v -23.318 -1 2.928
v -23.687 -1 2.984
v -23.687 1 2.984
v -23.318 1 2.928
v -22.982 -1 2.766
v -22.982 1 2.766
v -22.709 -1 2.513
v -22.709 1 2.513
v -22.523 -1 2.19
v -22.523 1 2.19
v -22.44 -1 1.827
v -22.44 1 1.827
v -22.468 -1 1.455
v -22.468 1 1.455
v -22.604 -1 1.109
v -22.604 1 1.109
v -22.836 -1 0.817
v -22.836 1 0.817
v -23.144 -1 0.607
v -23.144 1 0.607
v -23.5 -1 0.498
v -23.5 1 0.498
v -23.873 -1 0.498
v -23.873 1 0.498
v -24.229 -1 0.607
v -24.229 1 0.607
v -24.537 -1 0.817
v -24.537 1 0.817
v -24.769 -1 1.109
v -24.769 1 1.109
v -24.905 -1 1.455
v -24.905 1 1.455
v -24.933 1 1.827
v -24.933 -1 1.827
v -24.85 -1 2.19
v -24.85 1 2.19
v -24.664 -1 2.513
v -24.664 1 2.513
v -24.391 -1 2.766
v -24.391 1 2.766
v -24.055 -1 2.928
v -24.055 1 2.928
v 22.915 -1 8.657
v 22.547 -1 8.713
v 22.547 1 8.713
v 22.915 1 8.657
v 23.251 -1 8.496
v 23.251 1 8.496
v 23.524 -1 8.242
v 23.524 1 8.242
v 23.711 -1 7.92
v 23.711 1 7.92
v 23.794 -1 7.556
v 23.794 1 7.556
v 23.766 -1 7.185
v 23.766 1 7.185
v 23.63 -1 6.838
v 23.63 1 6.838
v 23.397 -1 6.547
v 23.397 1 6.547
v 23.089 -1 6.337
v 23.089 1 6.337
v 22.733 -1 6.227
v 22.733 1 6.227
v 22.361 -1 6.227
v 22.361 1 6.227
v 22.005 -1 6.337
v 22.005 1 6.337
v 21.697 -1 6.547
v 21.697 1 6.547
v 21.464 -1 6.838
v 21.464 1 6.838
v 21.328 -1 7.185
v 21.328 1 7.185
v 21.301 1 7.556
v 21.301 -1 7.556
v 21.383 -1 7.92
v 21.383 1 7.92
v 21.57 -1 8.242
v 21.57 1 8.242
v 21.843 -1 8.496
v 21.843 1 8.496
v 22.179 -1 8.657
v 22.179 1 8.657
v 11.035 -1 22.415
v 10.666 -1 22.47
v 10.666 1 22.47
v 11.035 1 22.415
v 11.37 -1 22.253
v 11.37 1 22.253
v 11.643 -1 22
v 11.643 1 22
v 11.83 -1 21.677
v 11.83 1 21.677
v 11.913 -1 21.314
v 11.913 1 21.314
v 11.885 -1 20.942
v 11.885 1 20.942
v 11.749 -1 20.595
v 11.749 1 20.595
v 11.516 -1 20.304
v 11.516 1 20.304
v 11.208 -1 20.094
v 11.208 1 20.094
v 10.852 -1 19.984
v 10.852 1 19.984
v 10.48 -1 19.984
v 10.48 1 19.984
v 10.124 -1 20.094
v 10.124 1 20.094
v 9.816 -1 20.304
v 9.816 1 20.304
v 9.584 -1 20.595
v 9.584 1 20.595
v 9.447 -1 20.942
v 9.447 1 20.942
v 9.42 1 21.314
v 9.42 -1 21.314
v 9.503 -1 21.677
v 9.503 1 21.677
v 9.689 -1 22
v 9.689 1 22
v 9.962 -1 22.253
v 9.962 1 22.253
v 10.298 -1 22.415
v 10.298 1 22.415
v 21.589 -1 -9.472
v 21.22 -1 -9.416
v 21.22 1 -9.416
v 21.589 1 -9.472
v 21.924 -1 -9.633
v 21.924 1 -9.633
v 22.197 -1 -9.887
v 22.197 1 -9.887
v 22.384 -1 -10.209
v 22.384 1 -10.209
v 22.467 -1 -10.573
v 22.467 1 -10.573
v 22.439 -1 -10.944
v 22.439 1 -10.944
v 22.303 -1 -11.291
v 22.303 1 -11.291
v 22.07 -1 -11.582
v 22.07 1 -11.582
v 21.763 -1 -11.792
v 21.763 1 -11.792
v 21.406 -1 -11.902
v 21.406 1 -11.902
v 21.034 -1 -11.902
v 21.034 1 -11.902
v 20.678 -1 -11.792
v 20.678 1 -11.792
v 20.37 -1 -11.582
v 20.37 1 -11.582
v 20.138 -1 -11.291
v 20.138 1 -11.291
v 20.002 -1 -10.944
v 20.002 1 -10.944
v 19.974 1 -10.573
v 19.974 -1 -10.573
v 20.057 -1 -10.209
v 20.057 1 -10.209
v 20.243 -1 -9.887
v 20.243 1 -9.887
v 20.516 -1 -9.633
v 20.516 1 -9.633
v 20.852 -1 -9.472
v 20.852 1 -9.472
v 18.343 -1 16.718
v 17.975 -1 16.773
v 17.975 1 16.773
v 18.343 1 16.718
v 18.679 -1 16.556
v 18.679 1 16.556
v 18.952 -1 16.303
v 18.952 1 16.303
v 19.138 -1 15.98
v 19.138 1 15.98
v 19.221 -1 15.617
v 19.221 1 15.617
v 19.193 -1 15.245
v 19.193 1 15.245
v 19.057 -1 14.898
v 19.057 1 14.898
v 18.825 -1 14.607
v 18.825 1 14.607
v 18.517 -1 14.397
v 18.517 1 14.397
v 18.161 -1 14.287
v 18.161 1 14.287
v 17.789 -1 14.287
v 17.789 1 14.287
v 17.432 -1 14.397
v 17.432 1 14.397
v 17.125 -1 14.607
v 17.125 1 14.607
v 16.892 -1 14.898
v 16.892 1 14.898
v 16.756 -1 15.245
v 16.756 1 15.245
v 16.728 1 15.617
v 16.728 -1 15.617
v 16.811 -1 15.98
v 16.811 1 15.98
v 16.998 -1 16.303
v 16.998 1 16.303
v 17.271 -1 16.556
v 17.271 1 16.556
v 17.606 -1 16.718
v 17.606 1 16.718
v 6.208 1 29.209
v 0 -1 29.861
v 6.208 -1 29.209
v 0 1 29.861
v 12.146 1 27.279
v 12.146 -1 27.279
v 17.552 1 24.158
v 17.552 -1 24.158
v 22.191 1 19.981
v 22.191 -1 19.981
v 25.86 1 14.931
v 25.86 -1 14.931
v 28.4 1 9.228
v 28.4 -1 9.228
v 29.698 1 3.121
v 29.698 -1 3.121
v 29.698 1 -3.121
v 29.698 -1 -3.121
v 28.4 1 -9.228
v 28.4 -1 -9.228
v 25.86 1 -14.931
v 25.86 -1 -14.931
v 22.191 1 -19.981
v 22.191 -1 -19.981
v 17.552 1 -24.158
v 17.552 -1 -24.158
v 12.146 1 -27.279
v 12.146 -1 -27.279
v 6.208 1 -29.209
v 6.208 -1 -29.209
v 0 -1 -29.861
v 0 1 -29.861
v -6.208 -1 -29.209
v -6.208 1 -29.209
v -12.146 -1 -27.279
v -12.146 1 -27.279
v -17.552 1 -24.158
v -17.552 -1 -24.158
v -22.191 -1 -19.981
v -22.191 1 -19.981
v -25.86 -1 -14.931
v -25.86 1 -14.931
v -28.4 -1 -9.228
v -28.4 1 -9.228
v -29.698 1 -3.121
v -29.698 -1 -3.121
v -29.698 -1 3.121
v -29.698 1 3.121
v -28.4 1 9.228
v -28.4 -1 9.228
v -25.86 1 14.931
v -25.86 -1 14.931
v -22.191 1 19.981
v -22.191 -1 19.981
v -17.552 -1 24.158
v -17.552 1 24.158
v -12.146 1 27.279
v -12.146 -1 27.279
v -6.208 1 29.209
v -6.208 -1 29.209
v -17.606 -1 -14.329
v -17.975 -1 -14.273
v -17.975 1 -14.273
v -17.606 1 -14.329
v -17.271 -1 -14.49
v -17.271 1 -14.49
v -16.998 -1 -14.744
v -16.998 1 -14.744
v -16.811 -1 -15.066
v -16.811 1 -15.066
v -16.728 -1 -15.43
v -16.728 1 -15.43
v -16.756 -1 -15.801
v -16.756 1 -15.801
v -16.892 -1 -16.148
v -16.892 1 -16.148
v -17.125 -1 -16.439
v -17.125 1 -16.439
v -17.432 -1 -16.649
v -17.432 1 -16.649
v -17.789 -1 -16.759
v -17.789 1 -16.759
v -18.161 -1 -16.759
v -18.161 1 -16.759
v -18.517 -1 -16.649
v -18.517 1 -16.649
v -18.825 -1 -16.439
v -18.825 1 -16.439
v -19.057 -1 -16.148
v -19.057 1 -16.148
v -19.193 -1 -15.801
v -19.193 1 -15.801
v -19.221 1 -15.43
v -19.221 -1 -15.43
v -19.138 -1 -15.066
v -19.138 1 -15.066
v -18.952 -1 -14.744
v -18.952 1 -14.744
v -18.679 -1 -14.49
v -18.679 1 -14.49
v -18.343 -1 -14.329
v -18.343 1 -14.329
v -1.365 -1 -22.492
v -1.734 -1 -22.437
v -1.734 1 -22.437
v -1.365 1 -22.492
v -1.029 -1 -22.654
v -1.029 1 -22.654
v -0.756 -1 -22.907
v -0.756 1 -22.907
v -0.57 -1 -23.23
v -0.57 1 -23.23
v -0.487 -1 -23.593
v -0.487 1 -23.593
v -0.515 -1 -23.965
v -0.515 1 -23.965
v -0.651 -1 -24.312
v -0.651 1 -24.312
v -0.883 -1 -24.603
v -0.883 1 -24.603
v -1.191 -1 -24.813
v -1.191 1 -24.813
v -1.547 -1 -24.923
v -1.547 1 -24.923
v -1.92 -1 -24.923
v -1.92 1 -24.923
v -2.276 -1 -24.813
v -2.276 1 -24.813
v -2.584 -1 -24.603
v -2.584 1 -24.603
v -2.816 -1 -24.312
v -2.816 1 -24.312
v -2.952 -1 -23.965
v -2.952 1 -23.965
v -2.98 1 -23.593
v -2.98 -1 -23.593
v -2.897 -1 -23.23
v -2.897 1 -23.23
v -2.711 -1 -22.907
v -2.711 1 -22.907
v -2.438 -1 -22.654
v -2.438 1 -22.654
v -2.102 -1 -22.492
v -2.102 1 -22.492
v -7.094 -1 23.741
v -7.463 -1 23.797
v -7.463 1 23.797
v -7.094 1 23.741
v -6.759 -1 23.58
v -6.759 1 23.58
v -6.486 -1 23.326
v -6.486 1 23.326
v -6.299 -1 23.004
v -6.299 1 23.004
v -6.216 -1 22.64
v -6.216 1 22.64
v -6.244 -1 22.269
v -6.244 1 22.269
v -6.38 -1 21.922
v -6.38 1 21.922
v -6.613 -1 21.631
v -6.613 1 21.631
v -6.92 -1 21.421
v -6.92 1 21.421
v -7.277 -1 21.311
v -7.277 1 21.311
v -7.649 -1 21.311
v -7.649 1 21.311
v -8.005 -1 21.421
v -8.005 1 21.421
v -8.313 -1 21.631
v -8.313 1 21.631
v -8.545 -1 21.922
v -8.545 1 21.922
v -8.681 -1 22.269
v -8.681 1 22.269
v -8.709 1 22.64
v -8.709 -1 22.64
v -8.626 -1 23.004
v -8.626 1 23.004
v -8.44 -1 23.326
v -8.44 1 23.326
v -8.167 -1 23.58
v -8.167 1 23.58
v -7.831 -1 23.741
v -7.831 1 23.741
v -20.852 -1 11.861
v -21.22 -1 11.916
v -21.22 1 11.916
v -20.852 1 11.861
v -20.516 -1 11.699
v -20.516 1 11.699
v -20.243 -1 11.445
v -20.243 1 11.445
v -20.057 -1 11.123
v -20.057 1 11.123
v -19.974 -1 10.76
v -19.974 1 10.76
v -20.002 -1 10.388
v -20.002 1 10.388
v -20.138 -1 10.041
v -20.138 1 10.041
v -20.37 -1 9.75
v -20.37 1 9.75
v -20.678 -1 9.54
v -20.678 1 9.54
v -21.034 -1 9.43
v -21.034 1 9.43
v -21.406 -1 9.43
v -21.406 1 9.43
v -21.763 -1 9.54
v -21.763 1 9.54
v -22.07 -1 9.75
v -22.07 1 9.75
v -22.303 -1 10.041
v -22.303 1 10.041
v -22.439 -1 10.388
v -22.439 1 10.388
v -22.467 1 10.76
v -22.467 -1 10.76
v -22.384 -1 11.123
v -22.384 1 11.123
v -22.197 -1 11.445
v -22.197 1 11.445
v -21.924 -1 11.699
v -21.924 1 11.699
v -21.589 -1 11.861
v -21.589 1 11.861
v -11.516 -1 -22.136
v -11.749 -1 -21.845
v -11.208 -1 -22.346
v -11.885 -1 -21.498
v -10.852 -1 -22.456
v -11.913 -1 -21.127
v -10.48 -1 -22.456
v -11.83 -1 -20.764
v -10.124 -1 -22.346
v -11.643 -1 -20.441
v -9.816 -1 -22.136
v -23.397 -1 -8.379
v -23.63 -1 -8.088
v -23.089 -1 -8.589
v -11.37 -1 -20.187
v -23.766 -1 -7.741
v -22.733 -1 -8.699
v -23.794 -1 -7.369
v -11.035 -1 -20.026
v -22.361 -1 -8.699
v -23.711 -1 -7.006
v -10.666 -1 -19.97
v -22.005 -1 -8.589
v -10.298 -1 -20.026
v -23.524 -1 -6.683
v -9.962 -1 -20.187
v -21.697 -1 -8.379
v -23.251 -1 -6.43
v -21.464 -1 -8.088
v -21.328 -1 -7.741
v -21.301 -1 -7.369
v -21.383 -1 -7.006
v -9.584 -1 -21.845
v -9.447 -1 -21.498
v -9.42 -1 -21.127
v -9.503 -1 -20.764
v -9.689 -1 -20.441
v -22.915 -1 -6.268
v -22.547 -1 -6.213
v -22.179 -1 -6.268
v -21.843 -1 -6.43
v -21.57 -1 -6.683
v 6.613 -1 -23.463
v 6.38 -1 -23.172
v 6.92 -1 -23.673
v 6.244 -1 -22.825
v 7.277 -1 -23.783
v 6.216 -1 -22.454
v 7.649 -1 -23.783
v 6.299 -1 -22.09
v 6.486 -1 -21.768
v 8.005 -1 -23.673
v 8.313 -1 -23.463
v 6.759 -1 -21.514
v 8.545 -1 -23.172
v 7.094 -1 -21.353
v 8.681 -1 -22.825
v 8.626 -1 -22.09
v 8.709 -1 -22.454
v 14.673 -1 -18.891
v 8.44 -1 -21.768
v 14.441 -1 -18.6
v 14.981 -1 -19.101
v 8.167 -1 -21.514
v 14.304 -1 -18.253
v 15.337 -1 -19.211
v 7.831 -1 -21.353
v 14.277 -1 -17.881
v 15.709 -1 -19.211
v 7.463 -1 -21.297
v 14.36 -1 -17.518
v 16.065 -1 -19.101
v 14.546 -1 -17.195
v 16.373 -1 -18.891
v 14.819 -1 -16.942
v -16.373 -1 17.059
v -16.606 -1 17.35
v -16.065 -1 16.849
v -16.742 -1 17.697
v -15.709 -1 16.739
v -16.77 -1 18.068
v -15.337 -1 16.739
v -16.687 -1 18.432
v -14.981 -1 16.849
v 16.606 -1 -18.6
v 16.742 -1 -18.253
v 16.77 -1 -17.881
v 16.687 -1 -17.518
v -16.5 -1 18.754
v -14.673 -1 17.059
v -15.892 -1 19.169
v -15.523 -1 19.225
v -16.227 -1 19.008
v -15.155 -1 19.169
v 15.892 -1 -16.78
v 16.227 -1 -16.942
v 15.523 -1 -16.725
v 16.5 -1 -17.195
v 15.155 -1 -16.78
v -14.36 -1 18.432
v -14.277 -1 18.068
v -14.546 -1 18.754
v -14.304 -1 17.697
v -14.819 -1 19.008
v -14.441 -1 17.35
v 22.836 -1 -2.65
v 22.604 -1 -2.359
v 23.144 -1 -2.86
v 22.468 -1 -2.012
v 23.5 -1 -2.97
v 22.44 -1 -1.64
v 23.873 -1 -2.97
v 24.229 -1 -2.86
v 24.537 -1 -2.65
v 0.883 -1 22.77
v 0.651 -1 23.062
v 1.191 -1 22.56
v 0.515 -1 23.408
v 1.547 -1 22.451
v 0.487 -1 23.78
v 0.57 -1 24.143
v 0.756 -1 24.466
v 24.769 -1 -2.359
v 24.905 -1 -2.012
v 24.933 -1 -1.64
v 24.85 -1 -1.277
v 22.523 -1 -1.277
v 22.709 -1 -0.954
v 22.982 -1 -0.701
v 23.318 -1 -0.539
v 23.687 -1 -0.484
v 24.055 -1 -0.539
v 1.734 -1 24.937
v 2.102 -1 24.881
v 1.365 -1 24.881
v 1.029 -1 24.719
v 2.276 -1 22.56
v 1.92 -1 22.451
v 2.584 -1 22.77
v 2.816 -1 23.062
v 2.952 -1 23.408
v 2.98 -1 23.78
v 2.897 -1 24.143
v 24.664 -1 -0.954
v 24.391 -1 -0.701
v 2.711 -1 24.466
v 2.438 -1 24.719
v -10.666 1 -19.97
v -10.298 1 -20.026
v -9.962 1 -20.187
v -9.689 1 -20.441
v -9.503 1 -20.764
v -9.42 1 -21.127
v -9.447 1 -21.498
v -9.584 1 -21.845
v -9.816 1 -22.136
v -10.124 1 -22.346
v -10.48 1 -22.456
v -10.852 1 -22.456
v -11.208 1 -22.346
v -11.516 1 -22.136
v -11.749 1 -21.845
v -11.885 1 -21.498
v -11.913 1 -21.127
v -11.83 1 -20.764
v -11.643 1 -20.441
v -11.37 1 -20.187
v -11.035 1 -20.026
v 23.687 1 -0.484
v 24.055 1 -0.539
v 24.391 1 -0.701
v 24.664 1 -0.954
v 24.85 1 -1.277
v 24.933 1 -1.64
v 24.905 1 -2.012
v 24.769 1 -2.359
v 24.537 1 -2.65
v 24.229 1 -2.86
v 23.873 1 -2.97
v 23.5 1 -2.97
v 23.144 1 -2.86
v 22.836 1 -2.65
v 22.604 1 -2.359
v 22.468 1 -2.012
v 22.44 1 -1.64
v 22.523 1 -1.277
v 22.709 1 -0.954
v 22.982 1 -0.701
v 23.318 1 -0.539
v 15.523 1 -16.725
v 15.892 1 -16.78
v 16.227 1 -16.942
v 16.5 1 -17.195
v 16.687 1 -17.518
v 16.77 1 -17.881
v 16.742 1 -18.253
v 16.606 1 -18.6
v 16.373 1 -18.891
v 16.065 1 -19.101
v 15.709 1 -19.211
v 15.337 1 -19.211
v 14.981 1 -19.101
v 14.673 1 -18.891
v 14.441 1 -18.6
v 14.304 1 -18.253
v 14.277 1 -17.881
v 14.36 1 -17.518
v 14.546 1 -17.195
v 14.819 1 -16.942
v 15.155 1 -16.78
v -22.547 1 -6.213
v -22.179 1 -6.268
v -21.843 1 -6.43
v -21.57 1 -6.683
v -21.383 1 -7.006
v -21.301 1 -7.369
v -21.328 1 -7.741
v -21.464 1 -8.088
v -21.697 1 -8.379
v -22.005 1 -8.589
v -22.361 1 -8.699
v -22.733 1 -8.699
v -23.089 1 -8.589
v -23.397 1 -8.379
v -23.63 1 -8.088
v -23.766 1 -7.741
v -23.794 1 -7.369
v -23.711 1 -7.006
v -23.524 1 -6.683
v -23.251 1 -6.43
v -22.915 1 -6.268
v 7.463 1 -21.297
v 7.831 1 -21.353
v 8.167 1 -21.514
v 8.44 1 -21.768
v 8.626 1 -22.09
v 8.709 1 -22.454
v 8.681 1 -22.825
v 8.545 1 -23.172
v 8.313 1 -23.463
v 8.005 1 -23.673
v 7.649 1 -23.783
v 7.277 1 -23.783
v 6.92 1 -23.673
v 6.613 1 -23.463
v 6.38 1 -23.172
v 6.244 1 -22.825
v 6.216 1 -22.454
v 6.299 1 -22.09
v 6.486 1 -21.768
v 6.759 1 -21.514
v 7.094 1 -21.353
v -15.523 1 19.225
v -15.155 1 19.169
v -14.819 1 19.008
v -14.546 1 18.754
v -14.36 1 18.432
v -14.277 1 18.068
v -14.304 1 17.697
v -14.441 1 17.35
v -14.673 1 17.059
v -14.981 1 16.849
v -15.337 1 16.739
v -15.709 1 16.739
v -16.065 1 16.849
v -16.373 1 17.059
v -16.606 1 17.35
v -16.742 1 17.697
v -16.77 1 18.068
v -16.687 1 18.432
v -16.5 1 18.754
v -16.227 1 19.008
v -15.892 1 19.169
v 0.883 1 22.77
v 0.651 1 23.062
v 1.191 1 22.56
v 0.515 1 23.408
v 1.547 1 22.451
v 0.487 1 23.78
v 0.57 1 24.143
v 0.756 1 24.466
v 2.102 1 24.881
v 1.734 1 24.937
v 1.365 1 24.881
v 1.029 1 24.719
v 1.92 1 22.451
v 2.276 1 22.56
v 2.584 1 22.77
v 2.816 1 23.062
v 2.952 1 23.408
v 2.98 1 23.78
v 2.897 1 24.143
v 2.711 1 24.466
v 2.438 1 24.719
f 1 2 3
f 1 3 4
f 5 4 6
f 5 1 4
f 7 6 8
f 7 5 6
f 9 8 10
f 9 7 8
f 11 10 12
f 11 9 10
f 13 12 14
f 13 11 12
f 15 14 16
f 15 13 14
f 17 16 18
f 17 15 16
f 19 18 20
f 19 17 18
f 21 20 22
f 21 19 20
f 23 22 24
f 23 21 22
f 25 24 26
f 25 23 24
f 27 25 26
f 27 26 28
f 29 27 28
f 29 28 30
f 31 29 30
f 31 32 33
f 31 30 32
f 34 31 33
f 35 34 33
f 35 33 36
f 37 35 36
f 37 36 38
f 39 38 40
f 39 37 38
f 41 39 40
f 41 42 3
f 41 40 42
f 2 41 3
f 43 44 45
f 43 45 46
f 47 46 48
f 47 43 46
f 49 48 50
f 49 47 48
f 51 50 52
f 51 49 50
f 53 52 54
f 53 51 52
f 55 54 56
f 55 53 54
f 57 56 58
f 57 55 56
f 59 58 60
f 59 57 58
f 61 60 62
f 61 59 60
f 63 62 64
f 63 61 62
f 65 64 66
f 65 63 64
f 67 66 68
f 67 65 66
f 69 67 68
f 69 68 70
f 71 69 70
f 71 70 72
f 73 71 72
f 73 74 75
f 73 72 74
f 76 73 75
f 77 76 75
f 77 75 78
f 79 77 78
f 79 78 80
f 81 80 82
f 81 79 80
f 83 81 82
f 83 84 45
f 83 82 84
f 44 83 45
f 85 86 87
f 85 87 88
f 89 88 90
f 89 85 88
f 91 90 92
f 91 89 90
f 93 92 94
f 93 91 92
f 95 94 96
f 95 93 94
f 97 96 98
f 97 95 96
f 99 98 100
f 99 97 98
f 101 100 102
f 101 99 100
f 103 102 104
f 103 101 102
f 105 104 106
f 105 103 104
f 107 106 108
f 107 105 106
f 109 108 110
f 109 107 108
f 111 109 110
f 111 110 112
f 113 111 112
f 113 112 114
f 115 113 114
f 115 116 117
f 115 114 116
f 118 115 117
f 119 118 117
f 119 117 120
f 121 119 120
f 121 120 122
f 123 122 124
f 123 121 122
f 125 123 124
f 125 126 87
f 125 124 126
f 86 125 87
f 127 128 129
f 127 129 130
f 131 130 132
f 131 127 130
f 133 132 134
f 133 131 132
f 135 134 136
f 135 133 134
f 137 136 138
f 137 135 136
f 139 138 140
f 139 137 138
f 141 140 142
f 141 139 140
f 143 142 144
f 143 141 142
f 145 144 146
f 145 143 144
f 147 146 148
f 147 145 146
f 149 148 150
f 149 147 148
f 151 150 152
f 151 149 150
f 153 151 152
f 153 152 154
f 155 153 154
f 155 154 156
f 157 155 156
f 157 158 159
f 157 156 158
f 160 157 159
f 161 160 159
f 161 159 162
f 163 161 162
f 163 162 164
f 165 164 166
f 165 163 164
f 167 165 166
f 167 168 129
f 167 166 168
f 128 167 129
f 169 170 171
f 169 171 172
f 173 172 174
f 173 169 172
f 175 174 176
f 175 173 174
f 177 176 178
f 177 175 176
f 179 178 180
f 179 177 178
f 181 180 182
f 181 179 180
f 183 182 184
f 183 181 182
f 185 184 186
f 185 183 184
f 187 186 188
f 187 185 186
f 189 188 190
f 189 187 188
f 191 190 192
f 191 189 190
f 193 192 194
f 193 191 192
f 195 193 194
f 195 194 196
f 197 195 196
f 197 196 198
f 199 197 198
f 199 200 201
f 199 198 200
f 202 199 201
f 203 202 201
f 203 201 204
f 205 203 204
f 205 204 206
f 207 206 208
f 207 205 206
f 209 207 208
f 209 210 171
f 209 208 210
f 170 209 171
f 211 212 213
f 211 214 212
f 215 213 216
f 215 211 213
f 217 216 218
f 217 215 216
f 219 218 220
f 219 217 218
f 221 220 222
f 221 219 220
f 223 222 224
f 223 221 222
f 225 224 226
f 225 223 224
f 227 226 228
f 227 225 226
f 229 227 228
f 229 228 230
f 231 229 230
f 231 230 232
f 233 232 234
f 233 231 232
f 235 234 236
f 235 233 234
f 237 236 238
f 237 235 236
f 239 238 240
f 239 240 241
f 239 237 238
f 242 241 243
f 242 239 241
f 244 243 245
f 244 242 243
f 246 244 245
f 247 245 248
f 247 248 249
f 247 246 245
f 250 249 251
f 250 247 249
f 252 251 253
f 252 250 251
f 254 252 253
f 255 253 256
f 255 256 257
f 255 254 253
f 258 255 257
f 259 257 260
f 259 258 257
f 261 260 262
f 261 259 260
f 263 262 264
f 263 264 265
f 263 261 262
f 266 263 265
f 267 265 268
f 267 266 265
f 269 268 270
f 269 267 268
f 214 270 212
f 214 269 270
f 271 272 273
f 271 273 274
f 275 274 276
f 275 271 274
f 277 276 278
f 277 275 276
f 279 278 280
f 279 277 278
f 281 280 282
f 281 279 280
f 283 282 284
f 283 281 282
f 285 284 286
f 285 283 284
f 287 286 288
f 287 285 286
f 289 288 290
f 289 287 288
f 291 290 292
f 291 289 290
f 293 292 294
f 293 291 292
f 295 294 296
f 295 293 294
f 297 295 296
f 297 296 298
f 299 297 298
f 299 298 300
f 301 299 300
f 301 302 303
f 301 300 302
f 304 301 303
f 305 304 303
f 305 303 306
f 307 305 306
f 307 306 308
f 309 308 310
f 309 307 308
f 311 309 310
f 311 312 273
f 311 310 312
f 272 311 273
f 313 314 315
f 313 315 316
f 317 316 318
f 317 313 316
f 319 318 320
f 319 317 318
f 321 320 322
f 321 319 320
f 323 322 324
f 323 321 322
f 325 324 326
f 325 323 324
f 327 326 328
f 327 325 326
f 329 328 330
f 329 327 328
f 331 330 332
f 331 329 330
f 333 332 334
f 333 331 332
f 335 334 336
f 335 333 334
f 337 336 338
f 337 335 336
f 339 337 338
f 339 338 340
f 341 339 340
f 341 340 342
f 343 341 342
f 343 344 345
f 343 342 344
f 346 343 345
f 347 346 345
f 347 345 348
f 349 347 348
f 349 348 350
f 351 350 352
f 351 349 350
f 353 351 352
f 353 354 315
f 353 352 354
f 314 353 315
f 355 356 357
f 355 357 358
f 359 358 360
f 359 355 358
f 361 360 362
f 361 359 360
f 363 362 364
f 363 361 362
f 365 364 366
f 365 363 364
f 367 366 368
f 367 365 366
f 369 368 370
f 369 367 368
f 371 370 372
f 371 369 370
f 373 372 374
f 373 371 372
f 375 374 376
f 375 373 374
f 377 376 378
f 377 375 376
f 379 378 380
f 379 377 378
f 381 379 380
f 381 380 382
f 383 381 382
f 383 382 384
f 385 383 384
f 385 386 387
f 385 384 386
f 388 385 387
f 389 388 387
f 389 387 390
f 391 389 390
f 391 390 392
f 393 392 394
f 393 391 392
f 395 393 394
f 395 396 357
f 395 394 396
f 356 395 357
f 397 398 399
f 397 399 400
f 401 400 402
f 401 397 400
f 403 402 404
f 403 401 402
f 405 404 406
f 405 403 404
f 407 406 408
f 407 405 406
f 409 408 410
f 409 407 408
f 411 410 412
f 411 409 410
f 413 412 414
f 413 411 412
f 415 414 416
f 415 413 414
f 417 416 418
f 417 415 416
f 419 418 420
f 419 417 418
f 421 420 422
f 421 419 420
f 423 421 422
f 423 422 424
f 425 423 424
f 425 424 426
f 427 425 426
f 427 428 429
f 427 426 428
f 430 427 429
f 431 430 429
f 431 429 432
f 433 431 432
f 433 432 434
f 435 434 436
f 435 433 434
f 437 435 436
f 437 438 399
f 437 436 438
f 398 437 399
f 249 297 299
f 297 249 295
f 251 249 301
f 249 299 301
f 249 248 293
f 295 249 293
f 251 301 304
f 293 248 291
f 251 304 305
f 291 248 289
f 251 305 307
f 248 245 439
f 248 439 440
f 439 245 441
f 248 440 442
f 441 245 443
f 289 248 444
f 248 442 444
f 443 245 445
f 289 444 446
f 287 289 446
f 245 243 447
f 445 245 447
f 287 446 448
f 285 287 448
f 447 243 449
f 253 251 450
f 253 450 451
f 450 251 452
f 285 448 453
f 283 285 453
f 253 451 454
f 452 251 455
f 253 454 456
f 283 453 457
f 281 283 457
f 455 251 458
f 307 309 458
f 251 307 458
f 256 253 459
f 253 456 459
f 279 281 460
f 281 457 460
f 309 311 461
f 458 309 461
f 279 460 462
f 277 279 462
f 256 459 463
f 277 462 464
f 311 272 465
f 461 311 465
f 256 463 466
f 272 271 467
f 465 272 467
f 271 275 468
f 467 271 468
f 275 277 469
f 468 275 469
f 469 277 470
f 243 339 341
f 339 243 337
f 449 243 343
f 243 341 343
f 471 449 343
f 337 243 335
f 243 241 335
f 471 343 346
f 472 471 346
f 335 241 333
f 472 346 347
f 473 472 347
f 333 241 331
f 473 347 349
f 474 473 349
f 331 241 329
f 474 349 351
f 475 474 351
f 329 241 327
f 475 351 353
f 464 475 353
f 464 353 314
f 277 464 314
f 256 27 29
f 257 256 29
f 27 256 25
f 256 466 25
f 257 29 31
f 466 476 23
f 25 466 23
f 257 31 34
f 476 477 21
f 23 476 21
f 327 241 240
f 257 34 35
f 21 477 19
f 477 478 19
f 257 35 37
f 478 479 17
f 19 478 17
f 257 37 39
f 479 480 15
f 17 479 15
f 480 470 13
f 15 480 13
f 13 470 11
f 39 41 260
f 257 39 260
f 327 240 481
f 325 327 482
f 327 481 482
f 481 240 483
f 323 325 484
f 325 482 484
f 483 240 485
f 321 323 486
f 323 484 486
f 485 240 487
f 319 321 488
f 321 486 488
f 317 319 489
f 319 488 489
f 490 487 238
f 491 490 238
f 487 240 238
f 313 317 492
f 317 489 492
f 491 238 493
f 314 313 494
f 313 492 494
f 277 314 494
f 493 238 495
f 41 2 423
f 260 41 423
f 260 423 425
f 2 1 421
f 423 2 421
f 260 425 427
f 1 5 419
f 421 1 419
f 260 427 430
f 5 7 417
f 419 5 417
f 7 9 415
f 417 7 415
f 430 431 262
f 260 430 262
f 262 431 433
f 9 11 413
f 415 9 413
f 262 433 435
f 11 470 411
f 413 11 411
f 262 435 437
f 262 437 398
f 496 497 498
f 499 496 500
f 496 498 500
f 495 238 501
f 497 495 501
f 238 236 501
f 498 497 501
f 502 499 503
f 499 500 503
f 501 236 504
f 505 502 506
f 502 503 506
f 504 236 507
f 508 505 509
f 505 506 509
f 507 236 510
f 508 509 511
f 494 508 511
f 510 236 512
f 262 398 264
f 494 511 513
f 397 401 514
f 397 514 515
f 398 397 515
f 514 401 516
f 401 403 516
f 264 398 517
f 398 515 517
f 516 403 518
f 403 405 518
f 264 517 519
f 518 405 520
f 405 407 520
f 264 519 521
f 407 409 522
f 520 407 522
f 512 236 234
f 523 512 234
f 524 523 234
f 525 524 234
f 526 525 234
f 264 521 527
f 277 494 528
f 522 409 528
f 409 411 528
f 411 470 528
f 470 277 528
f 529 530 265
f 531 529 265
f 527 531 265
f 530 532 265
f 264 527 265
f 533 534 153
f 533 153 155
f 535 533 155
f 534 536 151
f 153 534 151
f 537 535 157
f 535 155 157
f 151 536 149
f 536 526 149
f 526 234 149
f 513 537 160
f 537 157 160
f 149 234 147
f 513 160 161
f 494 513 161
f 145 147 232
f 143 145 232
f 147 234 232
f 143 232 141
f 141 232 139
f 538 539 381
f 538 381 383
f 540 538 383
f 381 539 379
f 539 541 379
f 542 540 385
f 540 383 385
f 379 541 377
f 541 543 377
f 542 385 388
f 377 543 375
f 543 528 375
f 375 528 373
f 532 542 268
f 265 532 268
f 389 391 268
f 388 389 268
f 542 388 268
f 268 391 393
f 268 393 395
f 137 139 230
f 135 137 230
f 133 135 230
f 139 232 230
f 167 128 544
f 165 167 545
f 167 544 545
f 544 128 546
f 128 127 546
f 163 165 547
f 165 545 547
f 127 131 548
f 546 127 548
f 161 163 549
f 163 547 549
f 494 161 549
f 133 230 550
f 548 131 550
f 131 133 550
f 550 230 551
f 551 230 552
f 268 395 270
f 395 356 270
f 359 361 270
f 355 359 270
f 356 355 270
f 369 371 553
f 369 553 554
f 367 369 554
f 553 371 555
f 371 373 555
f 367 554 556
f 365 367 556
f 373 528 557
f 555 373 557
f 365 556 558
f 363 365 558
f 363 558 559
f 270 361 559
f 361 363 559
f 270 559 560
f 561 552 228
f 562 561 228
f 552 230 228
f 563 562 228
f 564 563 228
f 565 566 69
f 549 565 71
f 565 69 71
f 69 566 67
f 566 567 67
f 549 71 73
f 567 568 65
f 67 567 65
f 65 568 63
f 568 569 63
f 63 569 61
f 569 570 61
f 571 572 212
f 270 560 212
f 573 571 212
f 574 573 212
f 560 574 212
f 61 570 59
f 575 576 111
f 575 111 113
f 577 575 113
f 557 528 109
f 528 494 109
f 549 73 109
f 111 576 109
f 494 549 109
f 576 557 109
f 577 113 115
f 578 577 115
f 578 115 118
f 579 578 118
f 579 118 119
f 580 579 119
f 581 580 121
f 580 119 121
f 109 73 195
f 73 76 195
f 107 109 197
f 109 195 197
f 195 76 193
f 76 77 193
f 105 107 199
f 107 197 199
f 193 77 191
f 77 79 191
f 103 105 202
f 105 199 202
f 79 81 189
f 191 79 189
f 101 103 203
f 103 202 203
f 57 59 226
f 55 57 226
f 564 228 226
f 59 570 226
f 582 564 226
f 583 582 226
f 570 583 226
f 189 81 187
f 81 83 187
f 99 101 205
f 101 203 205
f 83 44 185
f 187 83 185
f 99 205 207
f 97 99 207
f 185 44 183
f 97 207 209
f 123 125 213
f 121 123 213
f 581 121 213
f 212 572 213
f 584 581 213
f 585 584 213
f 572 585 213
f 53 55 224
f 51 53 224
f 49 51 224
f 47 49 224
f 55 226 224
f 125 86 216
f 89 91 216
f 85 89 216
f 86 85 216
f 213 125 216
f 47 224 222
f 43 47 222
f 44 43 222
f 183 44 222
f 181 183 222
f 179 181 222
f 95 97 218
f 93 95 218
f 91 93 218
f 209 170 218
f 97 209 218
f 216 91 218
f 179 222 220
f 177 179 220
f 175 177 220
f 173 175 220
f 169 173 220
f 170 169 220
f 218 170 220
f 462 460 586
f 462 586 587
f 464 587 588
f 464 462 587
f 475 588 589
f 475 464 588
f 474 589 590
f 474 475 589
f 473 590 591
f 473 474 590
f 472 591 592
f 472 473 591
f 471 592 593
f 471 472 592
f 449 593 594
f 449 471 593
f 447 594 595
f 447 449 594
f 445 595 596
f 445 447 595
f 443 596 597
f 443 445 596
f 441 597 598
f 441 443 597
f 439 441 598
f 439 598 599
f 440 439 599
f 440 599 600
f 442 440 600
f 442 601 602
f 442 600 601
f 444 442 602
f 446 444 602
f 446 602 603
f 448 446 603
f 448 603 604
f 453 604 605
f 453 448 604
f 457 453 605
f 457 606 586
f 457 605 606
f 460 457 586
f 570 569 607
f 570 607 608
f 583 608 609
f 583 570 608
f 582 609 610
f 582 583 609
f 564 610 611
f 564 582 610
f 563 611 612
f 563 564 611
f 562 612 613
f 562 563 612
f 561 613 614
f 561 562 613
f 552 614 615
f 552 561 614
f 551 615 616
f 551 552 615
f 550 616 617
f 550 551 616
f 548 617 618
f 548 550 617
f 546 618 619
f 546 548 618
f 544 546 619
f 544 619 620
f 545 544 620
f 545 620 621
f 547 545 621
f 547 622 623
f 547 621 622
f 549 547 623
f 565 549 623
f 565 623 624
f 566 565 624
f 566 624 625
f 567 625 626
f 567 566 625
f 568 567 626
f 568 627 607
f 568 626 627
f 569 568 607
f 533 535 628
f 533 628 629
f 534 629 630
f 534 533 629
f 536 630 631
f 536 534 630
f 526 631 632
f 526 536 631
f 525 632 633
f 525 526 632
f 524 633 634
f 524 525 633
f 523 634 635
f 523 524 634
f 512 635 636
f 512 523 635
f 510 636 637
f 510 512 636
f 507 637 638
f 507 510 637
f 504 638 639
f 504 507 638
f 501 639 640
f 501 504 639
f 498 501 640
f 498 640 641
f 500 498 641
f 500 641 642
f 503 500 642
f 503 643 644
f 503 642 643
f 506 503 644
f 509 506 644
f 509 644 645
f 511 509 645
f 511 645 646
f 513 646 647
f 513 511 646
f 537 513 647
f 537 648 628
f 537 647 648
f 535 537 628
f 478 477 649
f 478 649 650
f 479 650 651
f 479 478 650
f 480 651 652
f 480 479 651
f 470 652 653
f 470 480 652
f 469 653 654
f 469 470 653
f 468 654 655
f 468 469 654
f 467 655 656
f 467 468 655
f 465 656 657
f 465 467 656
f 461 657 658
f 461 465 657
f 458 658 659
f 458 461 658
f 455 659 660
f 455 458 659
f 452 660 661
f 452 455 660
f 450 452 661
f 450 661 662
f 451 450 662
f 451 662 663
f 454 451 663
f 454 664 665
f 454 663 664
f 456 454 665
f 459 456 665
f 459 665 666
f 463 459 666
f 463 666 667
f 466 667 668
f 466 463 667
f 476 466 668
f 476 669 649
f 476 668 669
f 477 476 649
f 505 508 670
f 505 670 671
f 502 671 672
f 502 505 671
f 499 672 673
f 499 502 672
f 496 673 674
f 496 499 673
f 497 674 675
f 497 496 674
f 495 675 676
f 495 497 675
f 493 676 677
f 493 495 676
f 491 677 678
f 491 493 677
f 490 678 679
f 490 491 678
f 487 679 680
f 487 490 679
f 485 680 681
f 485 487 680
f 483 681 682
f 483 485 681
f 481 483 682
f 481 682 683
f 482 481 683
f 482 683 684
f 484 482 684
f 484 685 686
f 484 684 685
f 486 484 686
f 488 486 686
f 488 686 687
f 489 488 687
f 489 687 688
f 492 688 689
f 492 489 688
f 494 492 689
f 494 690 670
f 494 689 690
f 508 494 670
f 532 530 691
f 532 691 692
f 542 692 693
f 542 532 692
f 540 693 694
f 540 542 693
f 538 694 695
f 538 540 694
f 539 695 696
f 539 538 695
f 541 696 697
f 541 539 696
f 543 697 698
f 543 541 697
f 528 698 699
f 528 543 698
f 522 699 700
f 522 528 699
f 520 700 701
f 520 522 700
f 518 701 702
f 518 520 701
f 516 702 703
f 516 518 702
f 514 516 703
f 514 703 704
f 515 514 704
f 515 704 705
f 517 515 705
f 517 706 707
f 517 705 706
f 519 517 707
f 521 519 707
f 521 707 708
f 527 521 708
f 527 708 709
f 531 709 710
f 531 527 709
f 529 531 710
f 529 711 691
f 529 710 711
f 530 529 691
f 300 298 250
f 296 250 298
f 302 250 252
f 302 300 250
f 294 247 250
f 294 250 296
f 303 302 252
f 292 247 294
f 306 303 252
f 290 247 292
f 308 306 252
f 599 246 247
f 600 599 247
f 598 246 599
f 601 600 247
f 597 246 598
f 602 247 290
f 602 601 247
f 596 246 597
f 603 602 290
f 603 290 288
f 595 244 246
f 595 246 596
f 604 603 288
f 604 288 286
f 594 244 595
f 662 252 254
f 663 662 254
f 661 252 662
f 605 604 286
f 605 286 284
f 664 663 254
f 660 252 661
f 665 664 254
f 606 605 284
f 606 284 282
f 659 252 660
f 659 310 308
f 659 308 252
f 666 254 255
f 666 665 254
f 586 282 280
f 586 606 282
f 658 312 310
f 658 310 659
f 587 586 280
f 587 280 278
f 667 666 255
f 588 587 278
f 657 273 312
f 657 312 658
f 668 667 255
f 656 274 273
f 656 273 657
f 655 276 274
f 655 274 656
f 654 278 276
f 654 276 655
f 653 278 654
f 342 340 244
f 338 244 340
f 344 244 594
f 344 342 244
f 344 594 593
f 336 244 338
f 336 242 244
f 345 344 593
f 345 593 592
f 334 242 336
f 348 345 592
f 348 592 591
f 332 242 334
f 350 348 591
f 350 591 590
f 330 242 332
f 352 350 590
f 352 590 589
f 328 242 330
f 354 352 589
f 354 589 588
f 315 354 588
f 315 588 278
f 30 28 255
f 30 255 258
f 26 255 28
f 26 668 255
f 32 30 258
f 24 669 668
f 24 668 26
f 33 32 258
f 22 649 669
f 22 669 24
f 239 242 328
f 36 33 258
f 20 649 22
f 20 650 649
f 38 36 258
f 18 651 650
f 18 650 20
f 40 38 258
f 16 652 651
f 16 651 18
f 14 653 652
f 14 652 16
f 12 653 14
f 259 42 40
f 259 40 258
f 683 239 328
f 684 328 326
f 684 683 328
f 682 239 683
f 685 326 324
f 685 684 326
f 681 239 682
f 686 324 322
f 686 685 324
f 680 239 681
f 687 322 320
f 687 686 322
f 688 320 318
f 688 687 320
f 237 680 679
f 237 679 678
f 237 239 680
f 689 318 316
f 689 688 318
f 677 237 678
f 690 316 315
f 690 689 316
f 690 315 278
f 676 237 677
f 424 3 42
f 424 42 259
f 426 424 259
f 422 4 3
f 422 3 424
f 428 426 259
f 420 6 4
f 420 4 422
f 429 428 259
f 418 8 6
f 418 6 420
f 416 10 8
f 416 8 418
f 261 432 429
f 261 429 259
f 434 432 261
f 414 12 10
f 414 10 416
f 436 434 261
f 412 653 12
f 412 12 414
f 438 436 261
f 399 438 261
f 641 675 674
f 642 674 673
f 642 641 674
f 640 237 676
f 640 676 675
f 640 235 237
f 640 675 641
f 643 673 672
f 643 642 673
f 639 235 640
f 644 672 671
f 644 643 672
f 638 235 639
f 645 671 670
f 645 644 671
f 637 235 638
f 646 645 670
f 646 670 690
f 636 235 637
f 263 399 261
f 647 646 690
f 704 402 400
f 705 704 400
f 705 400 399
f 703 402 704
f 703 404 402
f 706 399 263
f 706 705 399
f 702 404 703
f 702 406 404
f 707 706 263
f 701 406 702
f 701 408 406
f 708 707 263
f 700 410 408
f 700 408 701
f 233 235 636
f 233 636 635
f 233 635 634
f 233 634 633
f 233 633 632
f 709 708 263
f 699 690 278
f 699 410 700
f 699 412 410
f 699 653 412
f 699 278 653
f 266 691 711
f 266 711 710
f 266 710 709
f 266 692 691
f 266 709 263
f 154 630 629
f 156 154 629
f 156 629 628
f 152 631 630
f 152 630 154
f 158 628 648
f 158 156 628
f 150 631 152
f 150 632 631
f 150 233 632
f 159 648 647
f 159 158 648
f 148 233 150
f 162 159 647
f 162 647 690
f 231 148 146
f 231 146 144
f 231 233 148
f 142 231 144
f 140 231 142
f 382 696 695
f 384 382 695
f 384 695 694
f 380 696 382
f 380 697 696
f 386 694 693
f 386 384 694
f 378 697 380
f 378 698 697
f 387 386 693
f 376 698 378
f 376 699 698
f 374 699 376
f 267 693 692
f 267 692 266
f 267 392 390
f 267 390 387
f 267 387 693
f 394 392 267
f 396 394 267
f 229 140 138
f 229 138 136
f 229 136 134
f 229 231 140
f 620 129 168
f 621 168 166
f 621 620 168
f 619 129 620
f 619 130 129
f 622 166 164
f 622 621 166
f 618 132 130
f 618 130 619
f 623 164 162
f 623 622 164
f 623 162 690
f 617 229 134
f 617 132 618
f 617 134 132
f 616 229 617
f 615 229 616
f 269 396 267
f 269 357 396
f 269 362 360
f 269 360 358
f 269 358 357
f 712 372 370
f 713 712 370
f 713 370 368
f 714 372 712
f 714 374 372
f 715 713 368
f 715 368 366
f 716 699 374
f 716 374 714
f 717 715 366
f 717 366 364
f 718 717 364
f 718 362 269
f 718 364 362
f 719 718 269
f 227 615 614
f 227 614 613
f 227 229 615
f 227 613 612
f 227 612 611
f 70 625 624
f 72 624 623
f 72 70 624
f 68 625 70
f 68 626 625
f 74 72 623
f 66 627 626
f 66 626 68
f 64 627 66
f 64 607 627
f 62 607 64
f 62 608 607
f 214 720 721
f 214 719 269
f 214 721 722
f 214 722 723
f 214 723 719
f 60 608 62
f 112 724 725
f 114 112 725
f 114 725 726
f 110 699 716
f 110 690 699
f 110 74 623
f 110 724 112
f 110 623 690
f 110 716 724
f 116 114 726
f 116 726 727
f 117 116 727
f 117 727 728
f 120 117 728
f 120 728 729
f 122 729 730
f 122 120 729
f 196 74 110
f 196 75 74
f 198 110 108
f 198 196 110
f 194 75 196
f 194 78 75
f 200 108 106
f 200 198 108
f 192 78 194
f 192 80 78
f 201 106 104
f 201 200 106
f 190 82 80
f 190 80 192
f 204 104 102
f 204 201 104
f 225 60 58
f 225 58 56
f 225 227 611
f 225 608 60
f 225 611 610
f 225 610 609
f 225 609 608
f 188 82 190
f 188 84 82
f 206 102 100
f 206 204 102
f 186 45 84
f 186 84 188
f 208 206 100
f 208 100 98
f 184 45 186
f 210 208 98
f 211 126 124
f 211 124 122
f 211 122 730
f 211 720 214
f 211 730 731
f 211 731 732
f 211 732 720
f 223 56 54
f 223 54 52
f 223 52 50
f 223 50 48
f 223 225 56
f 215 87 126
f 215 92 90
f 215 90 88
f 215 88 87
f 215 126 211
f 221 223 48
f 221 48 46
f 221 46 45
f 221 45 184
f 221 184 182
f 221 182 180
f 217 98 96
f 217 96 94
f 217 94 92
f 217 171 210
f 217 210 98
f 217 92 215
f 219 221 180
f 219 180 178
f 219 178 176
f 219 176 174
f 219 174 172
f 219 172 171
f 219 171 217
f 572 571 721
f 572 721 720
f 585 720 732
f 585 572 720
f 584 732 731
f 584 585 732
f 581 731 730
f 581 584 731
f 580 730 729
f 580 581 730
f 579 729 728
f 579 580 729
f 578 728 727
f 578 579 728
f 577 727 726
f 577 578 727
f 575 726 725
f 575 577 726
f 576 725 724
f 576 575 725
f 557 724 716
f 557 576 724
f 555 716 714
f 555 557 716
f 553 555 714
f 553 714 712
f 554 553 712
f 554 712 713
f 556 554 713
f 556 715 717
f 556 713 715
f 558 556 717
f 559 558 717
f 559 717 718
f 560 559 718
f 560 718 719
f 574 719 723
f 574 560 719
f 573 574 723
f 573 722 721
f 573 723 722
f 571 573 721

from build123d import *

# Parameters (mm, degrees)
SKETCH1_R               = 29.86111111
BOSS_EXTRUDE1_DEPTH     = 1
CUT_EXTRUDE1_DEPTH      = 43.277321503
CUT_EXTRUDE1_DEPTH_BACK = 43.277321503
SKETCH2_R               = 1.25


with BuildPart() as part:
    # Sketch1 → Boss-Extrude1 (new, symmetric)
    with BuildSketch(Plane(origin=(0, 0, 0), x_dir=(1, 0, 0), z_dir=(0, 1, 0))):
        with Locations(Location((0, 0, 0), (0, 0, 270))):
            Circle(SKETCH1_R)
    extrude(amount=BOSS_EXTRUDE1_DEPTH, both=True)

    # Sketch2 → Cut-Extrude1 (cut, two sides: drawn at the far end of the back side and taken through both)
    with BuildSketch(Plane(origin=(0, 1, 0), x_dir=(1, 0, 0), z_dir=(0, 1, 0)).offset(-CUT_EXTRUDE1_DEPTH_BACK)):
        with Locations(Location((1.733610724, -23.686643786, 0), (0, 0, 270))):
            Circle(SKETCH2_R)
        with Locations(Location((-7.46283868, -22.54702949, 0), (0, 0, 270))):
            Circle(SKETCH2_R)
        with Locations(Location((-15.523138546, -17.974834344, 0), (0, 0, 270))):
            Circle(SKETCH2_R)
        with Locations(Location((-21.220181286, -10.66613361, 0), (0, 0, 270))):
            Circle(SKETCH2_R)
        with Locations(Location((-23.686643786, -1.733610724, 0), (0, 0, 270))):
            Circle(SKETCH2_R)
        with Locations(Location((-22.54702949, 7.46283868, 0), (0, 0, 270))):
            Circle(SKETCH2_R)
        with Locations(Location((-17.974834344, 15.523138546, 0), (0, 0, 270))):
            Circle(SKETCH2_R)
        with Locations(Location((-10.66613361, 21.220181286, 0), (0, 0, 270))):
            Circle(SKETCH2_R)
        with Locations(Location((-1.733610724, 23.686643786, 0), (0, 0, 270))):
            Circle(SKETCH2_R)
        with Locations(Location((10.66613361, -21.220181286, 0), (0, 0, 270))):
            Circle(SKETCH2_R)
        with Locations(Location((17.974834344, -15.523138546, 0), (0, 0, 270))):
            Circle(SKETCH2_R)
        with Locations(Location((22.54702949, -7.46283868, 0), (0, 0, 270))):
            Circle(SKETCH2_R)
        with Locations(Location((23.686643786, 1.733610724, 0), (0, 0, 270))):
            Circle(SKETCH2_R)
        with Locations(Location((21.220181286, 10.66613361, 0), (0, 0, 270))):
            Circle(SKETCH2_R)
        with Locations(Location((15.523138546, 17.974834344, 0), (0, 0, 270))):
            Circle(SKETCH2_R)
        with Locations(Location((7.46283868, 22.54702949, 0), (0, 0, 270))):
            Circle(SKETCH2_R)
    extrude(amount=CUT_EXTRUDE1_DEPTH + CUT_EXTRUDE1_DEPTH_BACK, mode=Mode.SUBTRACT)


solid = part.part
